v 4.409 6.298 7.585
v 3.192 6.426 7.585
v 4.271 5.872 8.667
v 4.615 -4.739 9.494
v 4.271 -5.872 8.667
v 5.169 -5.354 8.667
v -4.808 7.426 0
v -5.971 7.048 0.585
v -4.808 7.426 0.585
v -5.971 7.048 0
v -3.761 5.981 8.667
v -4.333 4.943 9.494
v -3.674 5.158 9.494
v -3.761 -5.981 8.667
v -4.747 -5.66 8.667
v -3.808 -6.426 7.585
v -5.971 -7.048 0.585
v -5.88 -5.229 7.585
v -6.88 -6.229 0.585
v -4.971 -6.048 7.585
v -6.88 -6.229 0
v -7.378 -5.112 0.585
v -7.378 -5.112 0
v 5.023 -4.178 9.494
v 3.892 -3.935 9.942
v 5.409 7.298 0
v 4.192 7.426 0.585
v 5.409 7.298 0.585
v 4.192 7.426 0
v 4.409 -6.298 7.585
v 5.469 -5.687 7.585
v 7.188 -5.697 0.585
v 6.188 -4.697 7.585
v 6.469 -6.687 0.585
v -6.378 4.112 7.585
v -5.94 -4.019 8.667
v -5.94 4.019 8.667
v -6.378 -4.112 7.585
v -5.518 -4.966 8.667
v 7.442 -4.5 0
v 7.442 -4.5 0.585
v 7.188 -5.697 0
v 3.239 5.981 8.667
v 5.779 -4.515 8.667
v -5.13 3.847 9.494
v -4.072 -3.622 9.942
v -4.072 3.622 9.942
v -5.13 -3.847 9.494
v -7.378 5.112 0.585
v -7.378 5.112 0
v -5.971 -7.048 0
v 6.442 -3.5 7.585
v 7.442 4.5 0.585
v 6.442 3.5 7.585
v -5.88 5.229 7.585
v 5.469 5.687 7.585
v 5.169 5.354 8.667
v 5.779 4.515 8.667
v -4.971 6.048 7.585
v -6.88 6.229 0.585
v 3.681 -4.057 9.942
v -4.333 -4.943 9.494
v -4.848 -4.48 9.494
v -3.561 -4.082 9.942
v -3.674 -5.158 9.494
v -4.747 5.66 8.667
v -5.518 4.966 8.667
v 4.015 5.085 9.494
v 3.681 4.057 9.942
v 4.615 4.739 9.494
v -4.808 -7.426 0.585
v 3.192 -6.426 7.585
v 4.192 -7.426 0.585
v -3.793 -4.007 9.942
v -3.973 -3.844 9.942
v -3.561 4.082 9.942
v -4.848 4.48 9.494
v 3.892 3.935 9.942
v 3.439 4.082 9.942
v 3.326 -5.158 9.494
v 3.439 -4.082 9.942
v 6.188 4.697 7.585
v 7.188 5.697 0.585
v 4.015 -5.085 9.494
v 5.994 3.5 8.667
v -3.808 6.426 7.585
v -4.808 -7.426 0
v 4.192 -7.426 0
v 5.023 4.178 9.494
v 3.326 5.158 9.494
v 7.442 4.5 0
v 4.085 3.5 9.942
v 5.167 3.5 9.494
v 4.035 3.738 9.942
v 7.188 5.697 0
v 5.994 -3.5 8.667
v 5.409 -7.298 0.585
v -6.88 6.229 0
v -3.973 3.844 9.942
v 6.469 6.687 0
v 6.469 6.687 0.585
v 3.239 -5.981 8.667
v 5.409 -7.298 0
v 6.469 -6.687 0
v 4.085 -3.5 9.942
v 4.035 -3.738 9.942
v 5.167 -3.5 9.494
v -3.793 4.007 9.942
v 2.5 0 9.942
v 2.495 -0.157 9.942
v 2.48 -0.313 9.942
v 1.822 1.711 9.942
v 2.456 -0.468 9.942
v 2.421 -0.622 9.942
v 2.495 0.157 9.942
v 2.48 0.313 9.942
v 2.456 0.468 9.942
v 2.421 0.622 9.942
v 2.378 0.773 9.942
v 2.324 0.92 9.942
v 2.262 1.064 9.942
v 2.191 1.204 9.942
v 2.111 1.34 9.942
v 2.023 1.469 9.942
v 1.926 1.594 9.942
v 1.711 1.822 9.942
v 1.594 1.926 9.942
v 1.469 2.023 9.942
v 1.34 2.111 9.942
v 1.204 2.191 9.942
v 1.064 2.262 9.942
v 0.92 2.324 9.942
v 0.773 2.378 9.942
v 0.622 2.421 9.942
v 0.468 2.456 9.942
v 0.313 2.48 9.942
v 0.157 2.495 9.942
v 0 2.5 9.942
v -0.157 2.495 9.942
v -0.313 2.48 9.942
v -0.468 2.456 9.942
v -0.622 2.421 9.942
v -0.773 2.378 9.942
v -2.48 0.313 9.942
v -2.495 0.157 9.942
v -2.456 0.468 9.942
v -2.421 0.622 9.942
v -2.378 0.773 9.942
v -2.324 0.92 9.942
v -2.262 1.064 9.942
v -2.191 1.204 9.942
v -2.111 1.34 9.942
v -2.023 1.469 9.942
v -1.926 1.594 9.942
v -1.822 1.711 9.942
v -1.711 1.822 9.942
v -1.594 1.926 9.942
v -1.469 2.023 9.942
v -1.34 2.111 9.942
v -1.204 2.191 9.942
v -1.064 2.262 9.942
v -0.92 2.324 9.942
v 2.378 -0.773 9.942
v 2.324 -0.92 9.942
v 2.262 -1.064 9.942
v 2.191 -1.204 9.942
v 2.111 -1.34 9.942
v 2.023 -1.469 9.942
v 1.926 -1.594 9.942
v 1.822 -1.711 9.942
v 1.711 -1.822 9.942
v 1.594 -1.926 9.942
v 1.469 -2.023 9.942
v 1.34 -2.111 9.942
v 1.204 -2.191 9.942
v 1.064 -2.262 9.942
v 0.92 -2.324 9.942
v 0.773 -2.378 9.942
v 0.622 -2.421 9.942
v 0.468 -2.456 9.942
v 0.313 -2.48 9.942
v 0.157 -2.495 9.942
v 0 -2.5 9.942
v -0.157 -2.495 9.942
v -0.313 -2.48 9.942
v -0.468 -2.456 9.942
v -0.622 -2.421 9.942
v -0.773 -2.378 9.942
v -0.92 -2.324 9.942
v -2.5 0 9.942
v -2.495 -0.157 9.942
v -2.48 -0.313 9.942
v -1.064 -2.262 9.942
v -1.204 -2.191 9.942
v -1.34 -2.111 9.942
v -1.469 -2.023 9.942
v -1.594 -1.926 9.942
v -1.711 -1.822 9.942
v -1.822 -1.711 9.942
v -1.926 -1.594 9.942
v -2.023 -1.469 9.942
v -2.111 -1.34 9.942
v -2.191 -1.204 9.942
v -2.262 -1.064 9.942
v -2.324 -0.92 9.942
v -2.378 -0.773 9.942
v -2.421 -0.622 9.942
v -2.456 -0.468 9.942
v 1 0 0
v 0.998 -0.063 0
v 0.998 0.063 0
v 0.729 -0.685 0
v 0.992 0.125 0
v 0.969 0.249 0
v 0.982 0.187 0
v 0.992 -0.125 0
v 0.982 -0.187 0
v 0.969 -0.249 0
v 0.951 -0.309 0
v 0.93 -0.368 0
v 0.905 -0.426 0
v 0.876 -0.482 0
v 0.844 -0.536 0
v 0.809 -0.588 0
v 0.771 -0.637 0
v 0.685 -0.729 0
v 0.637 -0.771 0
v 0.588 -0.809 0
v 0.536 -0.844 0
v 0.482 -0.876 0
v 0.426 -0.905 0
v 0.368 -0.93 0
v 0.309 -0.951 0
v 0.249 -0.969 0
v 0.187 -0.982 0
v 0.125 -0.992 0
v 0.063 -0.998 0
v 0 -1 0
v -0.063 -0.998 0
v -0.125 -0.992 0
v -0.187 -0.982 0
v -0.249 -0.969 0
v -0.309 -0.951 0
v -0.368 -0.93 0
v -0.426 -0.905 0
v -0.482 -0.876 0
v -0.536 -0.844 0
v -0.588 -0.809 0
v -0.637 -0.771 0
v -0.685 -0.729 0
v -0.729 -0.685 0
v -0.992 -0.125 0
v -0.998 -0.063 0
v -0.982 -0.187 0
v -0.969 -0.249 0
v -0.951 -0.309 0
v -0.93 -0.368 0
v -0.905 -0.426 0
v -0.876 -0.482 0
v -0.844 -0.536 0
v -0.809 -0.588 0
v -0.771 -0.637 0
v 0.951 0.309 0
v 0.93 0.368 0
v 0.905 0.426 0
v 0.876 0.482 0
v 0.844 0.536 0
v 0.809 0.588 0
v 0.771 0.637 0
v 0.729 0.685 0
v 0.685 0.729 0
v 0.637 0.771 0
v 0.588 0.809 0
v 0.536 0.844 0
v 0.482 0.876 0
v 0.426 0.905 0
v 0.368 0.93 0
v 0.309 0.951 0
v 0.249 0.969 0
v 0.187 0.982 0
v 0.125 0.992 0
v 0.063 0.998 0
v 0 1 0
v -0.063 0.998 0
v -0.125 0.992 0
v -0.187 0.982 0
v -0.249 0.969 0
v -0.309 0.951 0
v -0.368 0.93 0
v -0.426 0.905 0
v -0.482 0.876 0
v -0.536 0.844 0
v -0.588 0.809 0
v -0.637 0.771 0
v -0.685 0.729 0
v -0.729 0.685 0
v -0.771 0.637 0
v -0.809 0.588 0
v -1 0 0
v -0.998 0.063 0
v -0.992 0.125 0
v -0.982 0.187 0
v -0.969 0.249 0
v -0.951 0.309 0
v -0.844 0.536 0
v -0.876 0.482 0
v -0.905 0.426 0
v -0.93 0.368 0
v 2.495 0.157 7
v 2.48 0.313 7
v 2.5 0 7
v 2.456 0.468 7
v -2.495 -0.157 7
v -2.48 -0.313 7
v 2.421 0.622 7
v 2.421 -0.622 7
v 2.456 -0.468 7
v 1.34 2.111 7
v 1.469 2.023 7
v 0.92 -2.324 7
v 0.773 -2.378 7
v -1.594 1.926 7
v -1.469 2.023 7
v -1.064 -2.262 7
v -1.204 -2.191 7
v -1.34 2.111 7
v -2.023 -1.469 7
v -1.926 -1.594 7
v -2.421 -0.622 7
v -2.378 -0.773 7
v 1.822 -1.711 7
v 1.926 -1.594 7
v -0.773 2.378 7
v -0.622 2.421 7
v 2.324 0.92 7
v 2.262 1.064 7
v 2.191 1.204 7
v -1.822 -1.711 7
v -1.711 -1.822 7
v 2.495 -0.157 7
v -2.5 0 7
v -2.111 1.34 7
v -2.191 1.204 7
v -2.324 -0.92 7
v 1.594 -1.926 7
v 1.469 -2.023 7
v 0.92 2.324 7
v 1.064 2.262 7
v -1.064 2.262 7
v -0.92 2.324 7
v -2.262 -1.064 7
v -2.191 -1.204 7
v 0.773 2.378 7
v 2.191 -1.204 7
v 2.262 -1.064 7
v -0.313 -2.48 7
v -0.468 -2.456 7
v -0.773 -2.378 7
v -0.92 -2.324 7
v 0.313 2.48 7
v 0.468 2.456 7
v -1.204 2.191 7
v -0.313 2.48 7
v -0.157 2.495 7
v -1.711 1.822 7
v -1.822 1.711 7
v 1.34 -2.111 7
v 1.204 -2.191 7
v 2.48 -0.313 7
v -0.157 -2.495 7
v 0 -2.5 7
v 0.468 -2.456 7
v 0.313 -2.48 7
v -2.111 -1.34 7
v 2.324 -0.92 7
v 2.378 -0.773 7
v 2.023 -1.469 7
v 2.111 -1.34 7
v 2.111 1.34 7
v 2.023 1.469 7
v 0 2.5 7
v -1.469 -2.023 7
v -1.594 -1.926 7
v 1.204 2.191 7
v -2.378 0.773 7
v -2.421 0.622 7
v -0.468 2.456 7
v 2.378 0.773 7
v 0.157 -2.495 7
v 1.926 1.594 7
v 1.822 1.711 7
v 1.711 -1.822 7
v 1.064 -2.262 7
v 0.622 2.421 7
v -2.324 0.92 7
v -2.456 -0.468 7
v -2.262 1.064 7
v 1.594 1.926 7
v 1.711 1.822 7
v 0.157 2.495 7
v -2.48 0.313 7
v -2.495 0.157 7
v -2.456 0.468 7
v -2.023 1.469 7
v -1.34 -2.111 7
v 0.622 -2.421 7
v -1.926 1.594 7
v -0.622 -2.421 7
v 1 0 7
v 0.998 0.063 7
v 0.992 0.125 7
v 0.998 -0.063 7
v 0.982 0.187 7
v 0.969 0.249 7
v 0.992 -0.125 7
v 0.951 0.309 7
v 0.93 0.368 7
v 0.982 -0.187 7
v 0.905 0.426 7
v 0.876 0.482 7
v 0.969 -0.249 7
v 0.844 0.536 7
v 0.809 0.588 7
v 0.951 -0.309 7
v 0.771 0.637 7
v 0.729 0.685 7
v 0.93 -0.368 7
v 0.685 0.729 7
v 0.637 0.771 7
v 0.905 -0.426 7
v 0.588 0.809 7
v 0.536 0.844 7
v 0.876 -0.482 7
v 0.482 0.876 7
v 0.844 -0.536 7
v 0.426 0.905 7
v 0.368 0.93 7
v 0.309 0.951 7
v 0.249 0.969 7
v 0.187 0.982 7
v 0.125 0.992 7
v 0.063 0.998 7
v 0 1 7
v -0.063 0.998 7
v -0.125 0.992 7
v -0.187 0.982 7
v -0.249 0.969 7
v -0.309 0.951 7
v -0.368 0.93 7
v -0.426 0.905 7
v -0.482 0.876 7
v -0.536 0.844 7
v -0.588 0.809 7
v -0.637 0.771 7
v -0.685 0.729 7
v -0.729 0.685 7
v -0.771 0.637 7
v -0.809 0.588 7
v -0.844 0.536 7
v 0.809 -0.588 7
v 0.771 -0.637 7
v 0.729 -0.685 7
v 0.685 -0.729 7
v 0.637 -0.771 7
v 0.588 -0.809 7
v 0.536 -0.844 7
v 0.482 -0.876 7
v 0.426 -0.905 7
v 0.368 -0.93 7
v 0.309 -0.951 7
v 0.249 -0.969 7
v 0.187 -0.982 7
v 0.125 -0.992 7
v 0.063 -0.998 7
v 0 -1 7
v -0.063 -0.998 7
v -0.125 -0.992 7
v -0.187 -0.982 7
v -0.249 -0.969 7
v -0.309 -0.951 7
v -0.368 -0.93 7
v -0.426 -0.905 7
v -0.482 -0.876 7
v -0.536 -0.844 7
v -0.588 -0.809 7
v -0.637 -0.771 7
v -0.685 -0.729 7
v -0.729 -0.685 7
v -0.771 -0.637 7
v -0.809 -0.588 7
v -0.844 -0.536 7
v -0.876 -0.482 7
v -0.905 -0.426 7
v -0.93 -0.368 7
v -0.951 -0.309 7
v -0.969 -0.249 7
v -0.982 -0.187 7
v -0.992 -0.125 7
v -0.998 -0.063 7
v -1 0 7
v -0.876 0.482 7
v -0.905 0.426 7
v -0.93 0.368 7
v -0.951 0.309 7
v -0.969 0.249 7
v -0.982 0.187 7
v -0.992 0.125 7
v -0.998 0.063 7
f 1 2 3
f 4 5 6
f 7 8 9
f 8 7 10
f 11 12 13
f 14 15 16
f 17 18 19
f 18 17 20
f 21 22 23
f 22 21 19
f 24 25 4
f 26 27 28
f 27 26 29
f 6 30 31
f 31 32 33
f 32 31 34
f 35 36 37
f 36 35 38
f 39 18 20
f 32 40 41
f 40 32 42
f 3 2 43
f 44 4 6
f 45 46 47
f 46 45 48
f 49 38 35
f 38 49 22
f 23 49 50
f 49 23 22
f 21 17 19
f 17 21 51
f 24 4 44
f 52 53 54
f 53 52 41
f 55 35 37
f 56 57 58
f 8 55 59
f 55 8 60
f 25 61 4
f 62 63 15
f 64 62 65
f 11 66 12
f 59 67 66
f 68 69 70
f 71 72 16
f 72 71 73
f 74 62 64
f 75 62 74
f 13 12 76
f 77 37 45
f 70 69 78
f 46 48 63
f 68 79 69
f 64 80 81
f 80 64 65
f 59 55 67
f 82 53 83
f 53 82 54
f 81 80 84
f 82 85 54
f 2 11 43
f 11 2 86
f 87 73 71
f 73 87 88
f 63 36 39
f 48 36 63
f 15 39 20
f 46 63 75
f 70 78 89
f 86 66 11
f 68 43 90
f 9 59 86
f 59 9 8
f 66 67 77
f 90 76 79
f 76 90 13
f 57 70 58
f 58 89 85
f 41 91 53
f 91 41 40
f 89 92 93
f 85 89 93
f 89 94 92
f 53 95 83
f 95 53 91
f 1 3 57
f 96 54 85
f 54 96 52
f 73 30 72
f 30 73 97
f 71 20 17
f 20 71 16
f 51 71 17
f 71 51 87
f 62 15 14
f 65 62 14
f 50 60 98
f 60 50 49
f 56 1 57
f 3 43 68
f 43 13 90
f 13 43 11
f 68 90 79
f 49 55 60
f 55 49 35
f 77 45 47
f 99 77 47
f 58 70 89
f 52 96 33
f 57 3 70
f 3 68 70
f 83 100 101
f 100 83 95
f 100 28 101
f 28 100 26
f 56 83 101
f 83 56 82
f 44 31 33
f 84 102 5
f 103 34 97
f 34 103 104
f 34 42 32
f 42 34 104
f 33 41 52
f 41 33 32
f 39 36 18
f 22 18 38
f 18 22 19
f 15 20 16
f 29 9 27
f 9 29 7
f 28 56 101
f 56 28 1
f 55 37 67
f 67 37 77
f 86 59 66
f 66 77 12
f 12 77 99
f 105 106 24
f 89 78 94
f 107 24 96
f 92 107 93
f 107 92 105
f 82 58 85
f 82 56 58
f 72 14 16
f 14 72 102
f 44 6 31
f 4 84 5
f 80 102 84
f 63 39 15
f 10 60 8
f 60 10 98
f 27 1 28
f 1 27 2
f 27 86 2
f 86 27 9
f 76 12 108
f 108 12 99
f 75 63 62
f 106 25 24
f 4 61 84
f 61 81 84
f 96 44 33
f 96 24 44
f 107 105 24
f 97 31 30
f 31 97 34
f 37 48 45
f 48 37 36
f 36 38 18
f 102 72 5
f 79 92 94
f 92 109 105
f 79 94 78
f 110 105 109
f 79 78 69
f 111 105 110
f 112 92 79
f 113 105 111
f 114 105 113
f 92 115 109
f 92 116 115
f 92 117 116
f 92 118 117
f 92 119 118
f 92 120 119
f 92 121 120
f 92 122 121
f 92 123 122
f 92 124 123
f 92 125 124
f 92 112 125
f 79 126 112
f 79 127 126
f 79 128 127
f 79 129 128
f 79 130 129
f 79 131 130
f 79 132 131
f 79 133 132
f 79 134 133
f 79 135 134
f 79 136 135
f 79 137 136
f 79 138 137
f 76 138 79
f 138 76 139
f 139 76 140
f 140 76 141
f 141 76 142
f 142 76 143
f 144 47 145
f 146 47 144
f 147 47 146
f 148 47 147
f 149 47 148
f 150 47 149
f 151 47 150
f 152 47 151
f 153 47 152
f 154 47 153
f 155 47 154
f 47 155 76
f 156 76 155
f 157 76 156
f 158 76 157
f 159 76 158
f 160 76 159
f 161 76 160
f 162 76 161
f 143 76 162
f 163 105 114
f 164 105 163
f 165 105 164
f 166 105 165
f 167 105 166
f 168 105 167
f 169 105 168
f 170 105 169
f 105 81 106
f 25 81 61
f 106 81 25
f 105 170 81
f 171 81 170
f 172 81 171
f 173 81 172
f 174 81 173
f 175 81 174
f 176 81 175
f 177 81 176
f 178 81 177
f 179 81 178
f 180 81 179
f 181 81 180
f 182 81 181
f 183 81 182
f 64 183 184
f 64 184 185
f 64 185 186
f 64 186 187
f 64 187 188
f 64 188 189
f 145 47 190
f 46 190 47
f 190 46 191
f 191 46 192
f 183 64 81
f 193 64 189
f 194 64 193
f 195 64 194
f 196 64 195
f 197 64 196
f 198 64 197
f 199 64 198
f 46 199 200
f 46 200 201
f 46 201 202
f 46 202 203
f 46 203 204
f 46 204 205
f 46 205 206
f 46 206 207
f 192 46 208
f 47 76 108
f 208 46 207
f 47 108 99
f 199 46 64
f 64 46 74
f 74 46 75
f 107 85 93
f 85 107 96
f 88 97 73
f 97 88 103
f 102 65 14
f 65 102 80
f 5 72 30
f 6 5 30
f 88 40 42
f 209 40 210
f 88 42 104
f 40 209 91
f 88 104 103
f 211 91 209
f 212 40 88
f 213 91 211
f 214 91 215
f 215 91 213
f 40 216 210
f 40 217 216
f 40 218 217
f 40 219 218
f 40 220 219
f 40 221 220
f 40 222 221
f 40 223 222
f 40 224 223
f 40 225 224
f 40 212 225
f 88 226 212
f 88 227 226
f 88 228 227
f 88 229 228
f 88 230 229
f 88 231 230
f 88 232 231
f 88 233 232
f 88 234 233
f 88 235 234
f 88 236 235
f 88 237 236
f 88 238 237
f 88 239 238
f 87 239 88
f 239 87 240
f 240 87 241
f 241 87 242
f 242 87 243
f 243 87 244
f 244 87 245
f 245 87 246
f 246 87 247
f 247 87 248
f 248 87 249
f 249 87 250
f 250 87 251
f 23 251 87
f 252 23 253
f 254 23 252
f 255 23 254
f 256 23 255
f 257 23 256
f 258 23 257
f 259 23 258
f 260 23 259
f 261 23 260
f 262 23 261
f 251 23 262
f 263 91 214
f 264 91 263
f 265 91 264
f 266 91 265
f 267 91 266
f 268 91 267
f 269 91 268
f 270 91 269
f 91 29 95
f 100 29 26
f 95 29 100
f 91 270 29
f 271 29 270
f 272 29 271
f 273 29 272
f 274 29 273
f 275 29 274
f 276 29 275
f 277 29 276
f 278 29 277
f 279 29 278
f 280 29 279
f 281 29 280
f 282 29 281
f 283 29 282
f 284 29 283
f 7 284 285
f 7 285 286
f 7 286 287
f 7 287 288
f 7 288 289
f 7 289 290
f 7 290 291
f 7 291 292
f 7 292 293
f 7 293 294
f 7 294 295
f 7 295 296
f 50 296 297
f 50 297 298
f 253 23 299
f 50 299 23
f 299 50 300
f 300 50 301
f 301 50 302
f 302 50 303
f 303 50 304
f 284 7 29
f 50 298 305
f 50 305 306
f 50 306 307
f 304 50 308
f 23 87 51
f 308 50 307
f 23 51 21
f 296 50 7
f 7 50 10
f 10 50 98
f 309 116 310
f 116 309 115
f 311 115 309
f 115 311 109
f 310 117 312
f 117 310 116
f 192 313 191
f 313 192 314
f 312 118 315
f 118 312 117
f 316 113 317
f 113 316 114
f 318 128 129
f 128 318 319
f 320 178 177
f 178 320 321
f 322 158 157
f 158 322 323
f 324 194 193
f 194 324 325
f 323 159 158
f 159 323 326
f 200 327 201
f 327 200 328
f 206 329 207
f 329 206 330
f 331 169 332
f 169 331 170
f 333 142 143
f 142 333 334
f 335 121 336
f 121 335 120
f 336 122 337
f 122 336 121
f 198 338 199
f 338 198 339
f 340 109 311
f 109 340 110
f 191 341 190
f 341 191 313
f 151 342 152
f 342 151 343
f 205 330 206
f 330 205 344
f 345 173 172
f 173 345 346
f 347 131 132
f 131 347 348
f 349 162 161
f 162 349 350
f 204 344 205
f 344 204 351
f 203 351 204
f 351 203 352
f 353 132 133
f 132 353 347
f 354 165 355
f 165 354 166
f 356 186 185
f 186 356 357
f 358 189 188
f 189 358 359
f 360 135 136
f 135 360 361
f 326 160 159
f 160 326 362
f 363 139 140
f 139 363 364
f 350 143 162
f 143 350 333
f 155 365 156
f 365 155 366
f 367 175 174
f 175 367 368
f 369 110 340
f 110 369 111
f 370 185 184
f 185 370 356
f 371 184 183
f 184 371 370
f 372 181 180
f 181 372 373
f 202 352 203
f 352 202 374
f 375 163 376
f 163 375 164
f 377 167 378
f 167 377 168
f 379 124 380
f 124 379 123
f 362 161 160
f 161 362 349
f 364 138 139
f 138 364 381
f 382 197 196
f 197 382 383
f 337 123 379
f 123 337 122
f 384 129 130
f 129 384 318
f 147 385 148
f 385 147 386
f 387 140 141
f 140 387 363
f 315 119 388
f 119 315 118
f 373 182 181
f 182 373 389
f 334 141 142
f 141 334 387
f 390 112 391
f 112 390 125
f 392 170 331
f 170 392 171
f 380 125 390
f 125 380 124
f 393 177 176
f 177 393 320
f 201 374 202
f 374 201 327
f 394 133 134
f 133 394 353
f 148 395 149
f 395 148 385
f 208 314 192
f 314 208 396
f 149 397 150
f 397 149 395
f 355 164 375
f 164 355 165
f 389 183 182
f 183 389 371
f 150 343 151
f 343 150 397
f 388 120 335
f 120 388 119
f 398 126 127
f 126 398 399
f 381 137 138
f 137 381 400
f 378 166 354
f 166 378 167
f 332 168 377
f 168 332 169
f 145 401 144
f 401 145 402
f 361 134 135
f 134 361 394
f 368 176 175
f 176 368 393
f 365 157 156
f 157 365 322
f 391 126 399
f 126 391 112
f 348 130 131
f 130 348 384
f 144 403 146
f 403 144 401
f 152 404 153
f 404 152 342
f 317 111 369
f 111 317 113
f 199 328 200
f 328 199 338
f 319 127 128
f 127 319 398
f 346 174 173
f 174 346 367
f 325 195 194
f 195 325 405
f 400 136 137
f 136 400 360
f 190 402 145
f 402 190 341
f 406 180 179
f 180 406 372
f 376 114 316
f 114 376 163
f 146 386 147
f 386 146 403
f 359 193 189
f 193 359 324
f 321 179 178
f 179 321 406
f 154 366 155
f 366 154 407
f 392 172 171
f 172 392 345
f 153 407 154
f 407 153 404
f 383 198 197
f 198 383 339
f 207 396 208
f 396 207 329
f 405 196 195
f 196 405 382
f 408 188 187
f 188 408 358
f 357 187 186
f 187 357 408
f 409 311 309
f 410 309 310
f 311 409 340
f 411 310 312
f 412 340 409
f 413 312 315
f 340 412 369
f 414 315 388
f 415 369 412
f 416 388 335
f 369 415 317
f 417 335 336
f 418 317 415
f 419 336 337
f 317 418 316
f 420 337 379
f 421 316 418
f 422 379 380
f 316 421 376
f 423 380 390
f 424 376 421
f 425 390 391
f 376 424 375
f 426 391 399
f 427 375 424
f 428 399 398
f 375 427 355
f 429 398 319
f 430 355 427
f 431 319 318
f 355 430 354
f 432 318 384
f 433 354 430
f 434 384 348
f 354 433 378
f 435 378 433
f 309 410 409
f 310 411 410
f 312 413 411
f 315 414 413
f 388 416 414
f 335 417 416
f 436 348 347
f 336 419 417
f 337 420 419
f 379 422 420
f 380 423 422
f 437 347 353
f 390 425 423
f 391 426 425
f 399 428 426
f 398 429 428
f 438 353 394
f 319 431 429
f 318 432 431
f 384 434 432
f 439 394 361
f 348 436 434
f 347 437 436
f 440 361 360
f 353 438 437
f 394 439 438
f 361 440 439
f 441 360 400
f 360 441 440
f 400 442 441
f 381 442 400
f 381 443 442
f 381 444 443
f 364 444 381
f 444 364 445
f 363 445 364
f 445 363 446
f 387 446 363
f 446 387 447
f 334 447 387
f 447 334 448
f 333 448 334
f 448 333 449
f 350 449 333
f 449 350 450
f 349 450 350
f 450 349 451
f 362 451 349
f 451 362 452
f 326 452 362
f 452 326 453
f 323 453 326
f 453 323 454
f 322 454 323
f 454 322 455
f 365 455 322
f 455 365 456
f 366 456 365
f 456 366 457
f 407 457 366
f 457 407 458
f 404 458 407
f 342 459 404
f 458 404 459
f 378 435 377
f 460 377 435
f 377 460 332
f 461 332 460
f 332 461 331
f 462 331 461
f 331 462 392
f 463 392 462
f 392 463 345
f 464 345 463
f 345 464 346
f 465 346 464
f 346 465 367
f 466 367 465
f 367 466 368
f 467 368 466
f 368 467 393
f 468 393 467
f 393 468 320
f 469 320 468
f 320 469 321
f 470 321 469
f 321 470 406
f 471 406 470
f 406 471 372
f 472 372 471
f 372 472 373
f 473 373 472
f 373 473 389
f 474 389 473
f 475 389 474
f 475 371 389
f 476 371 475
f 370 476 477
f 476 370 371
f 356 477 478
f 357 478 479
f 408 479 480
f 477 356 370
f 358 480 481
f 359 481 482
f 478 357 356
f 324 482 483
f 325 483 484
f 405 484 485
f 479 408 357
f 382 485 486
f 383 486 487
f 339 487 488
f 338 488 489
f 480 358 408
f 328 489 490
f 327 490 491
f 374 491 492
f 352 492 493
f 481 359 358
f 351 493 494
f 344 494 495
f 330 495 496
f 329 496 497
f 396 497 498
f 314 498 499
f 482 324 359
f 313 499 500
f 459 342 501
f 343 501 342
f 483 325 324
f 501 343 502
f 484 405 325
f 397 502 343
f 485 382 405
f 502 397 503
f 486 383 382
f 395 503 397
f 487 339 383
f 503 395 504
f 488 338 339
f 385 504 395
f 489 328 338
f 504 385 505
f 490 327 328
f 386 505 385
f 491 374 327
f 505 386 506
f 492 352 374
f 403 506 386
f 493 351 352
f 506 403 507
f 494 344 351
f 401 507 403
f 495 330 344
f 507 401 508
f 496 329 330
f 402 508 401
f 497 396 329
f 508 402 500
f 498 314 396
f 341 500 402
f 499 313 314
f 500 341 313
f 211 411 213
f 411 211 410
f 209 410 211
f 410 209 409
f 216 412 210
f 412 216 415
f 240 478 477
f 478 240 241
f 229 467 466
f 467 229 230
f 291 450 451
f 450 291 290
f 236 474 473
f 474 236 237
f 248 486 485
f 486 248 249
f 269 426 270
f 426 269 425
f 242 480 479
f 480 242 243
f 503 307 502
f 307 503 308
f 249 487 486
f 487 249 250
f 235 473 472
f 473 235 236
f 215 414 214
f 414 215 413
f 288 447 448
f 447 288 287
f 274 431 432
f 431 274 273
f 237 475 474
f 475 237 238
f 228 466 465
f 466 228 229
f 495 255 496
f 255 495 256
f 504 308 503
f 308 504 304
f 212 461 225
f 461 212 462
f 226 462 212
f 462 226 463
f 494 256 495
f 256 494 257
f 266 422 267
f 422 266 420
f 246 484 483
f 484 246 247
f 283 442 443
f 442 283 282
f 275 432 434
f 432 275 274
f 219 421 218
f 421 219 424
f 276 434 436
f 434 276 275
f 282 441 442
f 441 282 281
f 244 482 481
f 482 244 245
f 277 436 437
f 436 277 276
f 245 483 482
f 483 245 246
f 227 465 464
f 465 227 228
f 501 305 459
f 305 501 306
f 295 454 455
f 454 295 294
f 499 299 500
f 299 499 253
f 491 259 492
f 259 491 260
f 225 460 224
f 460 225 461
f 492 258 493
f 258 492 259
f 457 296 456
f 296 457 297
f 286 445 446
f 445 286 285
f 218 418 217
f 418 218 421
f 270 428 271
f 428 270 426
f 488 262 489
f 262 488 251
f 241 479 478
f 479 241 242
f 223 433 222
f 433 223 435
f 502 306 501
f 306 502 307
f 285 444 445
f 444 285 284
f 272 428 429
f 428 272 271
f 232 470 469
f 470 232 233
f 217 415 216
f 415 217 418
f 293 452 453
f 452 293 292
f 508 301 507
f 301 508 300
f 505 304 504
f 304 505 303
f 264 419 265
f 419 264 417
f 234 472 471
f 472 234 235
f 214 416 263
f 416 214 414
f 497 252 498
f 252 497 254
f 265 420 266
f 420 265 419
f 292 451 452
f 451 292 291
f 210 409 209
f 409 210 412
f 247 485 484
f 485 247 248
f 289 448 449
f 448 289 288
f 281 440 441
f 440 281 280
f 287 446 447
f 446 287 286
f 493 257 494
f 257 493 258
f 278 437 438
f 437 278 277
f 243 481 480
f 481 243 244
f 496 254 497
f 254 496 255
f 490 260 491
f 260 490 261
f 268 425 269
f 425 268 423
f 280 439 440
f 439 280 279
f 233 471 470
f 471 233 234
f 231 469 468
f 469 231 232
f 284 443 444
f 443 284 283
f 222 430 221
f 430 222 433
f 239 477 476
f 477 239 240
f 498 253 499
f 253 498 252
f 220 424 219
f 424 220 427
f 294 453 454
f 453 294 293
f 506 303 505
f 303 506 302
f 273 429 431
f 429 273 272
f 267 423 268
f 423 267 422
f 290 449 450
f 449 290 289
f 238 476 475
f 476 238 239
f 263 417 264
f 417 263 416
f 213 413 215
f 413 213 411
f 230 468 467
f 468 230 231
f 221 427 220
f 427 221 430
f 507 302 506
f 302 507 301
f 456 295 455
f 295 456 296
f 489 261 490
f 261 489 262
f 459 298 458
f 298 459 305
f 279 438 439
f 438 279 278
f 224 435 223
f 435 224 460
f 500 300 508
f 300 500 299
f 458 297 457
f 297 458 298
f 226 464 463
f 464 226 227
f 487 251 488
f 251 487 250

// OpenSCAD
// [FL_INDEX: keywords="openscad, 3d_parametric, Parametric_Project_Foot, csg_solid" | COT="Parametric OpenSCAD design from 3DCodeverse"]
// Title: Parametric Project Foot

/* 

Parametric Project Foot Generator 

Mike Creuzer - thingiverse@creuzer.com 2013-03-31


*/

// Top is against the project
TopWidth = 15;
// Bottom is agains the floor
BottomWidth = 10;
// How tall the foot is
Height = 10;
// Curved edge radius
Smoothing = 3;
// Smothness of the Smoothing - aka the curve faciting.  15 is faceted but fastish, 100 is really smooth and takes days to render.
SubSmoothing = 15;

// Width of bolt head hole - including room for a ratchet socket if needed
BoltHeadWidth = 5;
// Depth of bolt head hole
BoltHeadDepth = 3;
// Bolt hole width/diameter
BoltWidth = 2;


difference()
{
	SquareFoot();
	bolthole();
}





module bolthole()
{
	translate([0,0,Height - (BoltHeadDepth/2)]) cylinder(h = BoltHeadDepth, r= BoltHeadWidth / 2, $fn=100, center = true);
	translate([0,0,Height/2]) cylinder(h = Height, r= BoltWidth / 2, $fn=100, center = true);
}



module SquareFoot()
{

difference()
{
	minkowski()
	{
		hull()
		{
			cube(size = [TopWidth - (2*Smoothing),TopWidth - (2*Smoothing),0.0001], center = true);
			translate([0,0,Height - Smoothing]) cube(size = [BottomWidth - (Smoothing),BottomWidth - (Smoothing),0.0001], center = true);
		}
		sphere(r=Smoothing, $fn=SubSmoothing);
	}
	translate([0,0, - Smoothing])  cube(size = [TopWidth,TopWidth,Smoothing * 2], center = true);
}


// These are just reference marks so I know that I got the shape and size right.
% hull()
{
 cube(size = [TopWidth,TopWidth,0.0001], center = true);
 translate([0,0,Height]) cube(size = [BottomWidth,BottomWidth,0.0001], center = true);
}

}
